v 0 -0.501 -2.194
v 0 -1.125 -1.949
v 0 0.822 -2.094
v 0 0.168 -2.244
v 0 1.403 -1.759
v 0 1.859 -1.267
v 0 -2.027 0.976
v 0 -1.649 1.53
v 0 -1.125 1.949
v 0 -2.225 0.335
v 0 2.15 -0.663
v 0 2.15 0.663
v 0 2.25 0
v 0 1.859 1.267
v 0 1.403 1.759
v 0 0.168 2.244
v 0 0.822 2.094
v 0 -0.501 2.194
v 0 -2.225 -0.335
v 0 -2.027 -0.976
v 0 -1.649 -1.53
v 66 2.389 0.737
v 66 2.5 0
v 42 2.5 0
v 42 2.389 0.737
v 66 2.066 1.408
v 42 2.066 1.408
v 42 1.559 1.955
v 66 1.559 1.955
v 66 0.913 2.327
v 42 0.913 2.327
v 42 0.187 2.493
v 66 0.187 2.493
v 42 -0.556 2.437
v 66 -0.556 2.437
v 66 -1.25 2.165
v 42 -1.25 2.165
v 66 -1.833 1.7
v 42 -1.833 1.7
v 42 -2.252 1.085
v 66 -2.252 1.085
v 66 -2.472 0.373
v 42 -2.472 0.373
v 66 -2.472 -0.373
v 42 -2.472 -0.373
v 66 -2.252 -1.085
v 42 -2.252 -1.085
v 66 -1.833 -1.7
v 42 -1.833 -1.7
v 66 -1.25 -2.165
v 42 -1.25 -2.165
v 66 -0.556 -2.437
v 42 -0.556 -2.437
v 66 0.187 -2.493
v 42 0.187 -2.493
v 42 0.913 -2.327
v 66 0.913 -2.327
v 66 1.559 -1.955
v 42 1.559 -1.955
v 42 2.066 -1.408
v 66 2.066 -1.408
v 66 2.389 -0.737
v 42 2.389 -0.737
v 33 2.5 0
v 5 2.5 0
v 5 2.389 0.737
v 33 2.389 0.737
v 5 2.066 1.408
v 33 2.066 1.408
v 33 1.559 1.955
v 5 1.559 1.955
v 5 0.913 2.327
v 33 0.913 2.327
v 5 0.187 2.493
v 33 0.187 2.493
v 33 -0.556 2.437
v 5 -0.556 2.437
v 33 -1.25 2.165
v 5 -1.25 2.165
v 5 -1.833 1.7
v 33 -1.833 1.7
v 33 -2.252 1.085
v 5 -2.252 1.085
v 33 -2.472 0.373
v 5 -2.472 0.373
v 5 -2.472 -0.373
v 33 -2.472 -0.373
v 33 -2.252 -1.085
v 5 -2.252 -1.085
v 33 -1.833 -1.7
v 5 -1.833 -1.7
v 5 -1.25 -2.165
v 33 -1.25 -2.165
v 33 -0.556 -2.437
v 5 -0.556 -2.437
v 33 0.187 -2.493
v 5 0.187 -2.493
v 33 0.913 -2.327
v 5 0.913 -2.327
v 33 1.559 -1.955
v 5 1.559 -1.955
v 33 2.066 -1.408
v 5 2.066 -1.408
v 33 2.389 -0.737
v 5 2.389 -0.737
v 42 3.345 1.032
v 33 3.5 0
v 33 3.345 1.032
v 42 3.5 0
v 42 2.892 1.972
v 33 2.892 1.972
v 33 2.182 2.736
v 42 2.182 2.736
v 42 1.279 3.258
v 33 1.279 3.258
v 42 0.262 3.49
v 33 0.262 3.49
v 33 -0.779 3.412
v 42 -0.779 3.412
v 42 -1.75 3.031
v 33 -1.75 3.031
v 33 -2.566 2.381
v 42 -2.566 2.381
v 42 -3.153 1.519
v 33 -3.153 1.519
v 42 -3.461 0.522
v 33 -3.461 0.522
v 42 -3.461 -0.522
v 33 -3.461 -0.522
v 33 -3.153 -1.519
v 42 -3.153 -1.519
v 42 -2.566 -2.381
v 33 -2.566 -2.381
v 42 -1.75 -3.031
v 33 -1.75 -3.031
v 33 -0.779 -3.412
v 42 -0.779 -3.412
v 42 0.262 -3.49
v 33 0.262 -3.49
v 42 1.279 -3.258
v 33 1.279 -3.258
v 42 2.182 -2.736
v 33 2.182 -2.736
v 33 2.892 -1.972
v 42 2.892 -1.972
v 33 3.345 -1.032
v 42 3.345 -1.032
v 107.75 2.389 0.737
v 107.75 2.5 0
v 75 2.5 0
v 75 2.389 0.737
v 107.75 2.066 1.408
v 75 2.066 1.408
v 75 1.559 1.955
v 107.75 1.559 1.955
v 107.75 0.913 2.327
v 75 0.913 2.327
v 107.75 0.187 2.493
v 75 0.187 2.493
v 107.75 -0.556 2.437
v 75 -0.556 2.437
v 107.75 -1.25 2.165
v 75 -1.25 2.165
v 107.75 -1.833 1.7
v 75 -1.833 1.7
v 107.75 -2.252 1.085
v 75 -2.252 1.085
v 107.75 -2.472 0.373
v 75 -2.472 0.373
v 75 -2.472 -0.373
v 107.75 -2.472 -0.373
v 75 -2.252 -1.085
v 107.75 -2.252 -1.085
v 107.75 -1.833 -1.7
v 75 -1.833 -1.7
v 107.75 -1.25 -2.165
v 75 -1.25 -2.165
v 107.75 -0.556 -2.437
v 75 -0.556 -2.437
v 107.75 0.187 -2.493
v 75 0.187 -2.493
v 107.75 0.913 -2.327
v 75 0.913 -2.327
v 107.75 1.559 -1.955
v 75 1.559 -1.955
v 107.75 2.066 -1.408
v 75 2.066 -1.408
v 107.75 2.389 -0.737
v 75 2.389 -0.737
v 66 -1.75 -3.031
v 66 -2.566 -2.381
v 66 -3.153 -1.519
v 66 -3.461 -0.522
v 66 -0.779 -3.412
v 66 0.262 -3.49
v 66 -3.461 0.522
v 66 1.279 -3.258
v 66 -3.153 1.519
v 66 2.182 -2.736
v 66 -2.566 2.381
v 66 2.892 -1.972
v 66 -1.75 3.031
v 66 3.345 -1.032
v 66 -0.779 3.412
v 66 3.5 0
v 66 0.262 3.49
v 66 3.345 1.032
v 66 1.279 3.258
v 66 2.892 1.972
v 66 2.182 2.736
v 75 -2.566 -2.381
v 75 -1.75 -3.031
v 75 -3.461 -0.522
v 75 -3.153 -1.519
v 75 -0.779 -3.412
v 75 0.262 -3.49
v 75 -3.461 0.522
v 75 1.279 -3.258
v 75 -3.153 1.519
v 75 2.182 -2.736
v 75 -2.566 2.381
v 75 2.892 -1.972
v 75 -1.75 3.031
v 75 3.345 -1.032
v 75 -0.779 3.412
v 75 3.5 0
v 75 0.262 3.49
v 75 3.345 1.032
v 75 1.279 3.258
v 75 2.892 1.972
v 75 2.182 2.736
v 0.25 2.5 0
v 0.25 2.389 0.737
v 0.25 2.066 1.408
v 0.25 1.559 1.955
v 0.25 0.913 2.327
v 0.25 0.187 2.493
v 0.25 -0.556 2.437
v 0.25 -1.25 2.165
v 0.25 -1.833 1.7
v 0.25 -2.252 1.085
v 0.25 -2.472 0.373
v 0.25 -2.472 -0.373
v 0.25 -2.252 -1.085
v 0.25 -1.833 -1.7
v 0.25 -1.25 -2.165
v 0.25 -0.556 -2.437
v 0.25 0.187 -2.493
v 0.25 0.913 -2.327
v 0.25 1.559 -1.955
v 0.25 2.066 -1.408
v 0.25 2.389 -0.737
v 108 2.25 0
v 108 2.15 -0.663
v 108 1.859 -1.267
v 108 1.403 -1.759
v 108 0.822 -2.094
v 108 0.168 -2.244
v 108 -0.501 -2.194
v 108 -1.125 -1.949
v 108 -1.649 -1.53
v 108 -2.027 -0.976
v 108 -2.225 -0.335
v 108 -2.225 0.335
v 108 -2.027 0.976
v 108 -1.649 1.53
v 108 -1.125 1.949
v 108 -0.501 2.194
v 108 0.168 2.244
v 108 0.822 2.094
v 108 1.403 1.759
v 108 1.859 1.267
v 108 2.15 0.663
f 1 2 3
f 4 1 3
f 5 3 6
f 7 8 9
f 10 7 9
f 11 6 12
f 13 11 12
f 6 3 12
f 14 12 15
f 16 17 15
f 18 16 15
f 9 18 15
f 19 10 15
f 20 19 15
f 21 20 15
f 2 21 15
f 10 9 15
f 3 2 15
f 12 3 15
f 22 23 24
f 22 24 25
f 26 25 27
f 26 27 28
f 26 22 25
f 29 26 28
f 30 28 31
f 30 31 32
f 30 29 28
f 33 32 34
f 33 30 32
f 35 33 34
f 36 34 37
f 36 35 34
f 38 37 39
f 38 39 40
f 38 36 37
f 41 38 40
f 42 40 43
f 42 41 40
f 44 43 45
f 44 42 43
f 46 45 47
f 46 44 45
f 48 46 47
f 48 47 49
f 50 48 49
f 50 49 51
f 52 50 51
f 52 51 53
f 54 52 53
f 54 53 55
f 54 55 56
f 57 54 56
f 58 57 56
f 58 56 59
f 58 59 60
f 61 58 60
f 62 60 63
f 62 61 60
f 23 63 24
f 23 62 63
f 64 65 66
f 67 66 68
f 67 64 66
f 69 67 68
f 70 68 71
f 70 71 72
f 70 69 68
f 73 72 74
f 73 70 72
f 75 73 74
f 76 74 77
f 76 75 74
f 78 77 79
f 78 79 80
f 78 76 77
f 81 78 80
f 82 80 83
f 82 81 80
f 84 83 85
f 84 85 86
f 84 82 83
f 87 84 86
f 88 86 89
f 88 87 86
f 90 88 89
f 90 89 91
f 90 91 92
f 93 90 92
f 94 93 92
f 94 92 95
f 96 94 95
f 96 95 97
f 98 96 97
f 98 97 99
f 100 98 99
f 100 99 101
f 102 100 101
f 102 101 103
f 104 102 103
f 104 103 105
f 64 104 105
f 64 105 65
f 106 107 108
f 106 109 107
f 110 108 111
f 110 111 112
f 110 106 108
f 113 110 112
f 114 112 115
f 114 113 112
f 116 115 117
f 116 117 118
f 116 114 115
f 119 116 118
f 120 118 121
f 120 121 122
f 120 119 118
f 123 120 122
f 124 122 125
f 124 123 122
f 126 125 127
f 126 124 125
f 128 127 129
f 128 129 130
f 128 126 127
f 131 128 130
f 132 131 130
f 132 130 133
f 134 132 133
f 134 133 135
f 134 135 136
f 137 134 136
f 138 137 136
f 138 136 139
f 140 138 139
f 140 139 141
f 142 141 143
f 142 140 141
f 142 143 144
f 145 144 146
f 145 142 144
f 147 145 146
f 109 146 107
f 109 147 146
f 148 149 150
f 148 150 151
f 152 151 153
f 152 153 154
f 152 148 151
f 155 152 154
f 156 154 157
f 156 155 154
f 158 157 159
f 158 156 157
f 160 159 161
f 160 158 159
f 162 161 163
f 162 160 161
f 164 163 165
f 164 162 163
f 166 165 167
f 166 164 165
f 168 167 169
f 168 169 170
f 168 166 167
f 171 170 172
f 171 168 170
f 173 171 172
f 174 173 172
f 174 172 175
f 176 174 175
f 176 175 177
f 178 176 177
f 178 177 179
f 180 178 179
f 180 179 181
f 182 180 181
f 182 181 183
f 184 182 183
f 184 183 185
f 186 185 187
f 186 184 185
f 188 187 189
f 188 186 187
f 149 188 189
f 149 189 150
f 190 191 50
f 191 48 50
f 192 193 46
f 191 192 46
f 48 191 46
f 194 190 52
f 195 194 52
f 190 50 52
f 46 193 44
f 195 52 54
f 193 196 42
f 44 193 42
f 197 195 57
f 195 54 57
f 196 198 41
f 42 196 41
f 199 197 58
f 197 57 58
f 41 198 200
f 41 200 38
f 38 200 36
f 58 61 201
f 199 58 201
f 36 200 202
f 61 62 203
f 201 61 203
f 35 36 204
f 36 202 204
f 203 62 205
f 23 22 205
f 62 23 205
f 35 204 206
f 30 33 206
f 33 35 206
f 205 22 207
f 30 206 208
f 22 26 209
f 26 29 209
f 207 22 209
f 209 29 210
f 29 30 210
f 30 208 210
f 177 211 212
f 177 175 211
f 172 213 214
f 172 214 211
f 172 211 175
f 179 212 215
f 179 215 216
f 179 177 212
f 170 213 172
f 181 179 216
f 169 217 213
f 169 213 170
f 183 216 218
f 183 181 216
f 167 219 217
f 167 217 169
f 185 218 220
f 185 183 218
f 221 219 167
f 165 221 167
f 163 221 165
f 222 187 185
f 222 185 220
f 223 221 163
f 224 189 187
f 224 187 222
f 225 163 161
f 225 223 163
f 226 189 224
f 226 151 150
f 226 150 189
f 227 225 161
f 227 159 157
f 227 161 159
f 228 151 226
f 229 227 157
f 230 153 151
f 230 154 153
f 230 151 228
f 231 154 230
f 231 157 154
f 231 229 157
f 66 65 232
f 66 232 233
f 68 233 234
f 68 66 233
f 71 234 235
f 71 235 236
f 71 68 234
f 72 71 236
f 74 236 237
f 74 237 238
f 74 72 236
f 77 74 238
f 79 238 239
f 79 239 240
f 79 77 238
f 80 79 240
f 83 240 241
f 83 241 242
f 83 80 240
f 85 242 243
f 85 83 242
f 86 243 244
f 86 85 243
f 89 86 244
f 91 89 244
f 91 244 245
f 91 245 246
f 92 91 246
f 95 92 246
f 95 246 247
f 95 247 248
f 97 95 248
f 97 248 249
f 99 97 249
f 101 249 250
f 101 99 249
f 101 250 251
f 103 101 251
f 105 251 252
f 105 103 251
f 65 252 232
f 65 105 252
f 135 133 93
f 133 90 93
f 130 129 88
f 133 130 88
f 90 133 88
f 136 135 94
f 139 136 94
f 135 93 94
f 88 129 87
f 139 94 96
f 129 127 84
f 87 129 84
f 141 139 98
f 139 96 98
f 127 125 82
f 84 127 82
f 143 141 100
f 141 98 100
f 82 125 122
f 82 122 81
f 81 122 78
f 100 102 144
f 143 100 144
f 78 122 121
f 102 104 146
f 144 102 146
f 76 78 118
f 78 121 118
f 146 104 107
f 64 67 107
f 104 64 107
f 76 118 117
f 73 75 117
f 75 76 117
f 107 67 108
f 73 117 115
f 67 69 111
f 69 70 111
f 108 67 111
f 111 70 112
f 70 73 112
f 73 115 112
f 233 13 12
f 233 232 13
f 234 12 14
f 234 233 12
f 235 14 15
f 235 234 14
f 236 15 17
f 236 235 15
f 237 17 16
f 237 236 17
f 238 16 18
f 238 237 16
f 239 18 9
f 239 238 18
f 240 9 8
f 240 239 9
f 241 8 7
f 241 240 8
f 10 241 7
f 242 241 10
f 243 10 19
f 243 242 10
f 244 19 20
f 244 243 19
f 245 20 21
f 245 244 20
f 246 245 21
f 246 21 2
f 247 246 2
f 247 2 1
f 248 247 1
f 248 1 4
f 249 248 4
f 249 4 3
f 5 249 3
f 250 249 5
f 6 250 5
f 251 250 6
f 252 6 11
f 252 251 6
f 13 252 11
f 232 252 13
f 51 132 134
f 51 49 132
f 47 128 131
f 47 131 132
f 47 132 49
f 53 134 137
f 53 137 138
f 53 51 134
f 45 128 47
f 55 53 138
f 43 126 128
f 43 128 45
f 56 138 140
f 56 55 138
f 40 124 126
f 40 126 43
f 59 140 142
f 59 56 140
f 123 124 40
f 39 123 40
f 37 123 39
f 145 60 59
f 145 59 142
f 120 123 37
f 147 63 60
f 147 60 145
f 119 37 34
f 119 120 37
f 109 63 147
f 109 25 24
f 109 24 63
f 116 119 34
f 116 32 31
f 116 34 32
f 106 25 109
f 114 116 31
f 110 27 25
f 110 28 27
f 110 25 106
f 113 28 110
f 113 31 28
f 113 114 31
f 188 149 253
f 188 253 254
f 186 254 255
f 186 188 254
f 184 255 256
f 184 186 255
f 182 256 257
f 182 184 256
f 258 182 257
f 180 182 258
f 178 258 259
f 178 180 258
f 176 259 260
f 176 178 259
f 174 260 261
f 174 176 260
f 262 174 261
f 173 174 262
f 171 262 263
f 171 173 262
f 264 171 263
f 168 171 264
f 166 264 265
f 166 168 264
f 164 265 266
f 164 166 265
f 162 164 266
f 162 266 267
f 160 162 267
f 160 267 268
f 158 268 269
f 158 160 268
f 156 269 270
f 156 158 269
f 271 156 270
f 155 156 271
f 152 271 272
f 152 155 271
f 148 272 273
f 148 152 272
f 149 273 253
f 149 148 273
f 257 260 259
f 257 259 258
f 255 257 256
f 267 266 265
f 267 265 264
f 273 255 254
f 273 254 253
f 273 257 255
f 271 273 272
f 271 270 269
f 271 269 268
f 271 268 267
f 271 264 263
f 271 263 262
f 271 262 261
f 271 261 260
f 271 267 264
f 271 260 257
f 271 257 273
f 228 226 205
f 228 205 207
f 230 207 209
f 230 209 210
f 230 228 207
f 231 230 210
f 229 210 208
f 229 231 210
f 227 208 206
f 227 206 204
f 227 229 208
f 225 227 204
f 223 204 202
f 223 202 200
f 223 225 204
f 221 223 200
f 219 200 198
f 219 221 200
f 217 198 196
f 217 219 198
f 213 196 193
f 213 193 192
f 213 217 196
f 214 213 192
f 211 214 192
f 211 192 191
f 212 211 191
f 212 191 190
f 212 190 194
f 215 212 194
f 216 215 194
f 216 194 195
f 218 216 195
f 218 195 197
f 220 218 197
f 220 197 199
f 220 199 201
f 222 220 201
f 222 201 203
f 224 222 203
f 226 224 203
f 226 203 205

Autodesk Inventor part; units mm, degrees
ref_plane "YZ Plane" through (0, 0, 0) normal (1, 0, 0) x (0, 1, 0)
ref_plane "XZ Plane" through (0, 0, 0) normal (0, 1, 0) x (-1, 0, 0)
ref_plane "XY Plane" through (0, 0, 0) normal (0, 0, 1) x (1, 0, 0)
sketch "草图1" plane through (0, 0, 0) normal (0, 0, 1) x (1, 0, 0)
  line L0 (0, 0) -> (0, 2.5)
  line L1 (0, 2.5) -> (5, 2.5)
  line L2 (5, 2.5) -> (33, 2.5)
  line L3 (33, 2.5) -> (33, 3.5)
  line L4 (33, 3.5) -> (42, 3.5)
  line L5 (42, 3.5) -> (42, 2.5)
  line L6 (42, 2.5) -> (66, 2.5)
  line L7 (66, 2.5) -> (66, 3.5)
  line L8 (66, 3.5) -> (75, 3.5)
  line L9 (75, 3.5) -> (75, 2.5)
  line L10 (75, 2.5) -> (108, 2.5)
  line L11 (108, 2.5) -> (108, 0)
  line L12 (108, 0) -> (0, 0)
  line L13 (-21.6, 0) -> (129.6, 0) projected
  dimension "d0" = 2.5
  dimension "d1" = 5
  dimension "d2" = 28
  dimension "d3" = 1
  dimension "d4" = 9
  dimension "d5" = 24
  dimension "d6" = 9
  dimension "d7" = 33
revolve "旋转1" add sketch "草图1" angle 360 about axis through (-10, 0, 0) along (1, 0, 0)
thread "螺纹1" size "M5x0.8" class "6g" standard "ANSI Metric M Profile" length 5
thread "螺纹2" size "M5x0.8" class "6g" standard "ANSI Metric M Profile" length 5
chamfer "倒角1" distance 0.25 angle 45 2 edges at (108, -2.5, 0) (0, -2.5, 0)
properties part number "刮肉轮轴"
